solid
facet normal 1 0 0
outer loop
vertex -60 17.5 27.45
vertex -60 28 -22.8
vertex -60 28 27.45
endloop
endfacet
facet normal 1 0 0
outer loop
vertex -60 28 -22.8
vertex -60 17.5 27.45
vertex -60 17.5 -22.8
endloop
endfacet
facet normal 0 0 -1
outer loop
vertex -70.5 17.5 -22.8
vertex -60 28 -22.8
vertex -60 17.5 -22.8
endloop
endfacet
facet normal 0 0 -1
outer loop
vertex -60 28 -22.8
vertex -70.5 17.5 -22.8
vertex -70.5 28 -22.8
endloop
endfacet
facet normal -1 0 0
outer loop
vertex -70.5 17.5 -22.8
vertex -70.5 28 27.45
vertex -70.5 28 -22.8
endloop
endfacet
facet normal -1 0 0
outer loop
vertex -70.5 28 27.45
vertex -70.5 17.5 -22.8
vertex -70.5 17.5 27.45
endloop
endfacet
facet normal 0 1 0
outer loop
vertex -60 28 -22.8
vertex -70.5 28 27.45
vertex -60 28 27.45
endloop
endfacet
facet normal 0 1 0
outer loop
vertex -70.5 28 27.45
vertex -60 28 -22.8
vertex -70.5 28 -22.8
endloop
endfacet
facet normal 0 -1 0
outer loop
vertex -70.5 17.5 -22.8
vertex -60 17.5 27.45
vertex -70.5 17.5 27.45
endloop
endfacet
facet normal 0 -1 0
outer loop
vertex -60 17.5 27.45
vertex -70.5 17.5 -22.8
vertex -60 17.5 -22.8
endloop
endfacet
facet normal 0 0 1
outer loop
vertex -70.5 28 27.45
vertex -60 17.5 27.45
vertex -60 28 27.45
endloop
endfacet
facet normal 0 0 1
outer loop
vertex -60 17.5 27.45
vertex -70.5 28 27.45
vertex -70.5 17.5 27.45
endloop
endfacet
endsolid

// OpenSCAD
include <threads.scad>;


//ScrewThread(5, 10, pitch=1.15, tooth_angle=30, tolerance=0.4, tip_height=0, tooth_height=1, tip_min_fract=0);
module OwnBolt(diameter, length, tolerance, pitch=0){
    drive_tolerance = pow(3*tolerance/HexDriveAcrossCorners(diameter),2)
    + 0.75*tolerance;

  difference() {
    cylinder(h=diameter-7, r=(HexAcrossCorners(diameter-2.5)/2-0.5*tolerance), $fn=20);
    cylinder(h=diameter-2.5,
      r=2.76 /*(HexDriveAcrossCorners(diameter)+drive_tolerance)/2*/, $fn=6,
      center=true);
  }
  
  //translate([0,0,diameter-5.01])
  //  cylinder(h=10, r=diameter/2);
  translate([0,0,diameter-7.01])
    ScrewThread(diameter, length+0.01, pitch, tolerance=tolerance, tooth_angle=55,
      tip_height=ThreadPitch(diameter), tooth_height=6,tip_min_fract=0.75);
};

module MarkerIntersectionUpper(width, depth, height){
    translate([0,0,31.5]){
        intersection(){
            cube([width, depth, height], center = true);
            translate([(width/2) - 11.8, depth/2 - 11.8, (height/2) - 0.24])
                cube([17.6, 17.6, 0.5], center = true);
       
        }
        intersection(){
            cube([width, depth, height], center = true);
            translate([-(width/2) + 11.8, -depth/2 + 11.8,(height/2) - 0.24])
                cube([17.6, 17.6, 0.5], center = true);
        }
    }   
}

module NumberIntersectionUpper(width, depth, height){
    translate([0,0,31.5]){
        //5
        intersection(){
            cube([width, depth, height], center = true);
            translate([(width/2) - 5,-(depth/2) + 5,(height/2)-0.2]){
                    rotate([0,0,180]){
                        rotate(a=[180,180,0]){
                            linear_extrude(height) {
                                text("5", size = letter_size, font = font,                              halign = "center", valign = "center", $fn = 32);
                            }
                        }
                     }
           }      
        }
    }
}

module NumberIntersectionLower(width, depth, height){
    //6
    intersection(){
        cube([width, depth, height], center = true);
        translate([(width/2) - 5,(depth/2) - 5,-(height/2)+0.2]){
            rotate(a=[0,180,180]){
                linear_extrude(height) {
                    text("6", size = letter_size, font = font, halign = "center", valign = "center", $fn = 32);
                }
            }
        }      
    }
    
    //4
    intersection(){
        cube([width, depth, height], center = true);
        translate([-(width/2) + 0.2,-(depth/2) + 5,-(height/2)+5]){
            rotate([-90,0,0]){
                rotate([0,90,180]){
                    linear_extrude(height) {
                        text("4", size = letter_size, font = font, halign = "center", valign = "center", $fn = 32);
                    }
                }
            }
            
        }    
    }
    
    //3
    intersection(){
        cube([width, depth, height], center = true);
        translate([-(width/2) + 5,(depth/2) - 0.2,-(height/2)+5]){
            rotate([0,-90,180]){
                rotate(a=[0,90,-90]){
                    linear_extrude(height) {
                    text("3", size = letter_size, font = font, halign = "center", valign = "center", $fn = 32);
                    }
                } 
            }   
        }    
    }
    
    //2
    intersection(){
        cube([width, depth, height], center = true);
        translate([(width/2) - 0.2,(depth/2) - 5,-(height/2)+5]){
            rotate([-90,0,180]){
                rotate([0,90,180]){
                    linear_extrude(height) {
                        text("2", size = letter_size, font = font, halign = "center", valign = "center", $fn = 32);
                    }
                }
            }
            
        }  
    }
    
    //1
    intersection(){
        cube([width, depth, height], center = true);
        translate([(width/2) - 5,-(depth/2) + 0.2,-(height/2)+5]){
            rotate([0,90,180]){
                rotate(a=[0,90,90]){
                    linear_extrude(height) {
                    text("1", size = letter_size, font = font, halign = "center", valign = "center", $fn = 32);
                    }
                } 
            }   
        }   
    }
}

module MarkerIntersectionLower(width, depth, height){
    //1
    intersection(){
        cube([width, depth, height], center = true);
        translate([(width/2) - 11.8, -depth/2 + 0.24, (height/2) - 11.8])
            cube([17.6, 0.5, 17.6], center = true);
       
    }
    
    intersection(){
        cube([width, depth, height], center = true);
        translate([-(width/2) + 11.8, -depth/2 + 0.24, -(height/2) + 11.8])
            cube([17.6, 0.5, 17.6], center = true);
    }
    
    //2
    intersection(){
        cube([width, depth, height], center = true);
        translate([(width/2) - 0.24, -depth/2 + 11.8, -(height/2) + 11.8])
            cube([0.5, 17.6, 17.6], center = true);
    }
    
    intersection(){
        cube([width, depth, height], center = true);
        translate([(width/2) - 0.24, depth/2 - 11.8, (height/2) - 11.8])
            cube([0.5, 17.6, 17.6], center = true);
    }
    
    //3
    intersection(){
        cube([width, depth, height], center = true);
        translate([(width/2) - 11.8, depth/2 - 0.24, -(height/2) + 11.8])
            cube([17.6, 0.5, 17.6], center = true);
    }
    
    intersection(){
        cube([width, depth, height], center = true);
        translate([-(width/2) + 11.8, depth/2 - 0.24, (height/2) - 11.8])
            cube([17.6, 0.5, 17.6], center = true);
    }
    
    //4
    intersection(){
        cube([width, depth, height], center = true);
        translate([-(width/2) + 0.24, depth/2 - 11.8, -(height/2) + 11.8])
            cube([0.5, 17.6, 17.6], center = true);
    }
    
    intersection(){
        cube([width, depth, height], center = true);
        translate([-(width/2) + 0.24, -depth/2 + 11.8, (height/2) - 11.8])
            cube([0.5, 17.6, 17.6], center = true);
    }
    
    //6
    intersection(){
        cube([width, depth, height], center = true);
        translate([-(width/2) + 11.8, depth/2 - 11.8, -(height/2) + 0.24])
            cube([17.6, 17.6, 0.5], center = true);
    }
    
    intersection(){
        cube([width, depth, height], center = true);
        translate([(width/2) - 11.8, -depth/2 + 11.8,-(height/2) + 0.24])
            cube([17.6, 17.6, 0.5], center = true);
    }
}

module BoxLower(width, depth, height){
    //ScrewHole(12.05, 39.05, position=[0,0,-13.5], rotation=[0,0,0], pitch=9, tooth_angle=55, tolerance=0.5, tooth_height=6)
    /*for(i = [(-width/2) + 5 : 14.5 : (width/2) - 5]){
            translate([i, (depth/2) - 15.5, -22.8])
                cube([10.5,10.5,50.3], center = false);     
        }*/
    difference(){
        cube([width, depth, height], center = true);
        
        //iron slots
        for(i = [(-width/2) + 5 : 14.5 : -70]){
            translate([i, (depth/2) - 15.5, -22.8])
                cube([10.5,10.5,50.4], center = false);     
        }
        
        /*for(i = [(-width/2) + 5 : 14.5 : (width/2) - 5]){
            translate([i, -(depth/2) + 5, -22.8])
                cube([10.5,10.5,50.4], center = false);     
        }
        
        for(i = [(-width/2) + 5 : 14.5 : -15]){
            translate([i, (depth/2) - 30.5,-22.8])
                cube([10.5,10.5,50.4], center = false);     
        }
        
        for(i = [16.5: 14.5 : (width/2) - 5]){
            translate([i, (depth/2) - 30.5,-22.8])
                cube([10.5,10.5,50.4], center = false);     
        }
        
        for(i = [(-width/2) + 5 : 14.5 : -15]){
            translate([i, -(depth/2) + 19.5,-22.8])
                cube([10.5,10.5,50.4], center = false);     
        }
        
        for(i = [16.5: 14.5 : (width/2) - 5]){
            translate([i, -(depth/2) + 19.5,-22.8])
                cube([10.5,10.5,50.4], center = false);     
        }*/
        
        //hole bolt
        /*translate([0,0,25.5])
            cylinder(h=5, r=12.5/2); 
  
        //hole box top
        translate([-width/2 + 2.5, depth/2 - 2.5, height/2 - 4.9])
            cylinder(h=5, r=1.5,$fs=0.5);
        translate([width/2 - 2.5, depth/2 - 2.5, height/2 - 4.9])
            cylinder(h=5, r=1.5,$fs=0.5);
        
        translate([-width/2 + 2.5, -depth/2 + 2.5, height/2 - 4.9])
            cylinder(h=5, r=1.5,$fs=0.5); 
        translate([width/2 - 2.5, -depth/2 + 2.5, height/2 - 4.9])
            cylinder(h=5, r=1.5,$fs=0.5);*/ 
        
        //numbered faces
        /*translate([(width/2) - 5,(depth/2) - 5,-(height/2)+0.2]){
            rotate(a=[0,180,180]){
                linear_extrude(height) {
                    text("6", size = letter_size, font = font, halign = "center", valign = "center", $fn = 32);
                }
            }
        }
        
        translate([-(width/2) + 0.2,-(depth/2) + 5,-(height/2)+5]){
            rotate([-90,0,0]){
                rotate([0,90,180]){
                    linear_extrude(height) {
                        text("4", size = letter_size, font = font, halign = "center", valign = "center", $fn = 32);
                    }
                }
            }
            
        }
        
        translate([(width/2) - 0.2,(depth/2) - 5,-(height/2)+5]){
            rotate([-90,0,180]){
                rotate([0,90,180]){
                    linear_extrude(height) {
                        text("2", size = letter_size, font = font, halign = "center", valign = "center", $fn = 32);
                    }
                }
            }
            
        }
        
        translate([(width/2) - 5,-(depth/2) + 0.2,-(height/2)+5]){
            rotate([0,90,180]){
                rotate(a=[0,90,90]){
                    linear_extrude(height) {
                    text("1", size = letter_size, font = font, halign = "center", valign = "center", $fn = 32);
                    }
                } 
            }   
        }
        
        translate([-(width/2) + 5,(depth/2) - 0.2,-(height/2)+5]){
            rotate([0,-90,180]){
                rotate(a=[0,90,-90]){
                    linear_extrude(height) {
                    text("3", size = letter_size, font = font, halign = "center", valign = "center", $fn = 32);
                    }
                } 
            }   
        }*/
        
        //marker spots
        //1
       /* translate([(width/2) - 11.8, -depth/2 + 0.24, (height/2) - 11.8])
            cube([17.6, 0.5, 17.6], center = true);
        translate([-(width/2) + 11.8, -depth/2 + 0.24, -(height/2) + 11.8])
            cube([17.6, 0.5, 17.6], center = true);
        
        //3
        translate([(width/2) - 11.8, depth/2 - 0.24, -(height/2) + 11.8])
            cube([17.6, 0.5, 17.6], center = true);
        translate([-(width/2) + 11.8, depth/2 - 0.24, (height/2) - 11.8])
            cube([17.6, 0.5, 17.6], center = true);
        
        //2
        translate([(width/2) - 0.24, -depth/2 + 11.8, -(height/2) + 11.8])
            cube([0.5, 17.6, 17.6], center = true);
        translate([(width/2) - 0.24, depth/2 - 11.8, (height/2) - 11.8])
            cube([0.5, 17.6, 17.6], center = true);
        
        //4
        translate([-(width/2) + 0.24, depth/2 - 11.8, -(height/2) + 11.8])
            cube([0.5, 17.6, 17.6], center = true);
        translate([-(width/2) + 0.24, -depth/2 + 11.8, (height/2) - 11.8])
            cube([0.5, 17.6, 17.6], center = true);
        
        //6
        translate([-(width/2) + 11.8, depth/2 - 11.8, -(height/2) + 0.24])
            cube([17.6, 17.6, 0.5], center = true);
        translate([(width/2) - 11.8, -depth/2 + 11.8,-(height/2) + 0.24])
            cube([17.6, 17.6, 0.5], center = true);*/
    }
}

module BoxUpper(width, depth, height){
    translate([0,0,31.5]){
        union(){
            difference(){
                cube([width, depth, height], center = true);
                           
                
                //hole bolt
                /*translate([0,0,-1.1])
                    cylinder(h=5.2, r=9.15);
                translate([0,0,-4.1])
                    cylinder(h=4.1, r=12.5/2);*/
                
                //numbered face
                translate([(width/2) - 5,-(depth/2) + 5,(height/2)-0.2]){
                    rotate([0,0,180]){
                        rotate(a=[180,180,0]){
                            linear_extrude(height) {
                                text("5", size = letter_size, font = font,                              halign = "center", valign = "center", $fn = 32);
                            }
                        }
                     }
                }
                
                translate([(width/2) - 5,-(depth/2)+0.25,(height/2)-4]){
                    rotate([180,-90,180]){
                        rotate(a=[90,90,0]){
                            linear_extrude(height) {
                                text("1", size = letter_size, font = font,                              halign = "center", valign = "center", $fn = 32);
                            }
                        }
                     }
                }
                
                translate([(-width/2) + 5,(depth/2)-0.25,(height/2)-4]){
                    rotate([0,-90,180]){
                        rotate(a=[90,90,0]){
                            linear_extrude(height) {
                                text("3", size = letter_size, font = font,                              halign = "center", valign = "center", $fn = 32);
                            }
                        }
                     }
                }
                
                //marker spots
                //5
                translate([(width/2) - 11.8, depth/2 - 11.8, (height/2) - 0.24])
                    cube([17.6, 17.6, 0.5], center = true);
                translate([-(width/2) + 11.8, -depth/2 + 11.8,(height/2) - 0.24])
                    cube([17.6, 17.6, 0.5], center = true);
            }
            
            //pin box top
            translate([-width/2 + 2.5, depth/2 - 2.5, -height/2 - 3.5])
                cylinder(h=5, r=1.35,$fs=0.5);
            translate([width/2 - 2.5, depth/2 - 2.5, -height/2 - 3.5])
                cylinder(h=5, r=1.35,$fs=0.5);
            
            translate([-width/2 + 2.5, -depth/2 + 2.5, -height/2 - 3.5])
                cylinder(h=5, r=1.35,$fs=0.5); 
            translate([width/2 - 2.5, -depth/2 + 2.5, -height/2 - 3.5])
                cylinder(h=5, r=1.35,$fs=0.5); 
        }
        
    }
    
}

/*translate([0,0,35.5])
    rotate([180,0,0])
        OwnBolt(12, 39, tolerance=0.5, pitch=9);*/
/*
translate([0, 0, 25]){
        ScrewHole(12.05, 35.05, position=[0,0,-14.9], rotation=[0,0,0], pitch=9, tooth_angle=55, tolerance=0.5, tooth_height=6)
    difference(){
     cube([20, 20, 50], center = true);
     translate([0,0,20.1])
        cylinder(h=5, r=12.5/2);
    }
    /*difference(){
        cube([20, 20, 50], center = true);
        translate([0,0,38])
            rotate([0,180,0])
               OwnBolt(12, 35, tolerance=0.5, pitch=9);
        }
}*/

/*
translate([0, 0, 27.5]){
difference(){
    cube([22, 22, 55], center = true);
    translate([0, 0, 2.5])
        cube([10.5, 10.5, 60.5], center = true);
}
}
*/

font = "DejaVu Sans:style=Bold";
letter_size = 5;
height = 0.5;

/***box***/
    
/*translate([0,0,-27.5]){
    translate([0,0, 20])
        BoxUpper(151, 66, 8);
    BoxLower(151, 66, 55);
}
*/
//BoxUpper(151, 66, 8);
//BoxLower(151, 66, 55);
difference(){   
    difference(){
            cube([142.5,64,54.9], center = true);
        BoxLower(151, 66, 55);
    }
}

/*for(i = [(-151/2) + 5 : 14.5 : (151/2) - 5]){
            translate([i, 17.5, -22.8])
                cube([10.5,10.5,50.4], center = false);    
        }*/
/*for(i = [16.5: 14.5 : (151/2) - 5]){
            translate([i, (66/2) - 30.5,-22.8])
                cube([10.5,10.5,50.4], center = false);     
        }*/
//translate([-70.5, 17.5,-22.8])       
//   cube([10.5,10.5,50.3], center = false);
    
/*translate([-70.5, 17.5,-22.8])       
        cube([10.525,10.525,50.3], center = false);

translate([60, 2.5,-22.8])       
    cube([10.525,10.525,50.3], center = false);

translate([ -27, -13.5,-22.8])       
    cube([10.525,10.525,50.3], center = false);

translate([2, -28,-22.8])       
    cube([10.525,10.525,50.3], center = false);*/
    
//MarkerIntersectionUpper(151,66,8);
//MarkerIntersectionLower(151,66,55);

//NumberIntersectionUpper(151,66,8);
//NumberIntersectionLower(151,66,55);
